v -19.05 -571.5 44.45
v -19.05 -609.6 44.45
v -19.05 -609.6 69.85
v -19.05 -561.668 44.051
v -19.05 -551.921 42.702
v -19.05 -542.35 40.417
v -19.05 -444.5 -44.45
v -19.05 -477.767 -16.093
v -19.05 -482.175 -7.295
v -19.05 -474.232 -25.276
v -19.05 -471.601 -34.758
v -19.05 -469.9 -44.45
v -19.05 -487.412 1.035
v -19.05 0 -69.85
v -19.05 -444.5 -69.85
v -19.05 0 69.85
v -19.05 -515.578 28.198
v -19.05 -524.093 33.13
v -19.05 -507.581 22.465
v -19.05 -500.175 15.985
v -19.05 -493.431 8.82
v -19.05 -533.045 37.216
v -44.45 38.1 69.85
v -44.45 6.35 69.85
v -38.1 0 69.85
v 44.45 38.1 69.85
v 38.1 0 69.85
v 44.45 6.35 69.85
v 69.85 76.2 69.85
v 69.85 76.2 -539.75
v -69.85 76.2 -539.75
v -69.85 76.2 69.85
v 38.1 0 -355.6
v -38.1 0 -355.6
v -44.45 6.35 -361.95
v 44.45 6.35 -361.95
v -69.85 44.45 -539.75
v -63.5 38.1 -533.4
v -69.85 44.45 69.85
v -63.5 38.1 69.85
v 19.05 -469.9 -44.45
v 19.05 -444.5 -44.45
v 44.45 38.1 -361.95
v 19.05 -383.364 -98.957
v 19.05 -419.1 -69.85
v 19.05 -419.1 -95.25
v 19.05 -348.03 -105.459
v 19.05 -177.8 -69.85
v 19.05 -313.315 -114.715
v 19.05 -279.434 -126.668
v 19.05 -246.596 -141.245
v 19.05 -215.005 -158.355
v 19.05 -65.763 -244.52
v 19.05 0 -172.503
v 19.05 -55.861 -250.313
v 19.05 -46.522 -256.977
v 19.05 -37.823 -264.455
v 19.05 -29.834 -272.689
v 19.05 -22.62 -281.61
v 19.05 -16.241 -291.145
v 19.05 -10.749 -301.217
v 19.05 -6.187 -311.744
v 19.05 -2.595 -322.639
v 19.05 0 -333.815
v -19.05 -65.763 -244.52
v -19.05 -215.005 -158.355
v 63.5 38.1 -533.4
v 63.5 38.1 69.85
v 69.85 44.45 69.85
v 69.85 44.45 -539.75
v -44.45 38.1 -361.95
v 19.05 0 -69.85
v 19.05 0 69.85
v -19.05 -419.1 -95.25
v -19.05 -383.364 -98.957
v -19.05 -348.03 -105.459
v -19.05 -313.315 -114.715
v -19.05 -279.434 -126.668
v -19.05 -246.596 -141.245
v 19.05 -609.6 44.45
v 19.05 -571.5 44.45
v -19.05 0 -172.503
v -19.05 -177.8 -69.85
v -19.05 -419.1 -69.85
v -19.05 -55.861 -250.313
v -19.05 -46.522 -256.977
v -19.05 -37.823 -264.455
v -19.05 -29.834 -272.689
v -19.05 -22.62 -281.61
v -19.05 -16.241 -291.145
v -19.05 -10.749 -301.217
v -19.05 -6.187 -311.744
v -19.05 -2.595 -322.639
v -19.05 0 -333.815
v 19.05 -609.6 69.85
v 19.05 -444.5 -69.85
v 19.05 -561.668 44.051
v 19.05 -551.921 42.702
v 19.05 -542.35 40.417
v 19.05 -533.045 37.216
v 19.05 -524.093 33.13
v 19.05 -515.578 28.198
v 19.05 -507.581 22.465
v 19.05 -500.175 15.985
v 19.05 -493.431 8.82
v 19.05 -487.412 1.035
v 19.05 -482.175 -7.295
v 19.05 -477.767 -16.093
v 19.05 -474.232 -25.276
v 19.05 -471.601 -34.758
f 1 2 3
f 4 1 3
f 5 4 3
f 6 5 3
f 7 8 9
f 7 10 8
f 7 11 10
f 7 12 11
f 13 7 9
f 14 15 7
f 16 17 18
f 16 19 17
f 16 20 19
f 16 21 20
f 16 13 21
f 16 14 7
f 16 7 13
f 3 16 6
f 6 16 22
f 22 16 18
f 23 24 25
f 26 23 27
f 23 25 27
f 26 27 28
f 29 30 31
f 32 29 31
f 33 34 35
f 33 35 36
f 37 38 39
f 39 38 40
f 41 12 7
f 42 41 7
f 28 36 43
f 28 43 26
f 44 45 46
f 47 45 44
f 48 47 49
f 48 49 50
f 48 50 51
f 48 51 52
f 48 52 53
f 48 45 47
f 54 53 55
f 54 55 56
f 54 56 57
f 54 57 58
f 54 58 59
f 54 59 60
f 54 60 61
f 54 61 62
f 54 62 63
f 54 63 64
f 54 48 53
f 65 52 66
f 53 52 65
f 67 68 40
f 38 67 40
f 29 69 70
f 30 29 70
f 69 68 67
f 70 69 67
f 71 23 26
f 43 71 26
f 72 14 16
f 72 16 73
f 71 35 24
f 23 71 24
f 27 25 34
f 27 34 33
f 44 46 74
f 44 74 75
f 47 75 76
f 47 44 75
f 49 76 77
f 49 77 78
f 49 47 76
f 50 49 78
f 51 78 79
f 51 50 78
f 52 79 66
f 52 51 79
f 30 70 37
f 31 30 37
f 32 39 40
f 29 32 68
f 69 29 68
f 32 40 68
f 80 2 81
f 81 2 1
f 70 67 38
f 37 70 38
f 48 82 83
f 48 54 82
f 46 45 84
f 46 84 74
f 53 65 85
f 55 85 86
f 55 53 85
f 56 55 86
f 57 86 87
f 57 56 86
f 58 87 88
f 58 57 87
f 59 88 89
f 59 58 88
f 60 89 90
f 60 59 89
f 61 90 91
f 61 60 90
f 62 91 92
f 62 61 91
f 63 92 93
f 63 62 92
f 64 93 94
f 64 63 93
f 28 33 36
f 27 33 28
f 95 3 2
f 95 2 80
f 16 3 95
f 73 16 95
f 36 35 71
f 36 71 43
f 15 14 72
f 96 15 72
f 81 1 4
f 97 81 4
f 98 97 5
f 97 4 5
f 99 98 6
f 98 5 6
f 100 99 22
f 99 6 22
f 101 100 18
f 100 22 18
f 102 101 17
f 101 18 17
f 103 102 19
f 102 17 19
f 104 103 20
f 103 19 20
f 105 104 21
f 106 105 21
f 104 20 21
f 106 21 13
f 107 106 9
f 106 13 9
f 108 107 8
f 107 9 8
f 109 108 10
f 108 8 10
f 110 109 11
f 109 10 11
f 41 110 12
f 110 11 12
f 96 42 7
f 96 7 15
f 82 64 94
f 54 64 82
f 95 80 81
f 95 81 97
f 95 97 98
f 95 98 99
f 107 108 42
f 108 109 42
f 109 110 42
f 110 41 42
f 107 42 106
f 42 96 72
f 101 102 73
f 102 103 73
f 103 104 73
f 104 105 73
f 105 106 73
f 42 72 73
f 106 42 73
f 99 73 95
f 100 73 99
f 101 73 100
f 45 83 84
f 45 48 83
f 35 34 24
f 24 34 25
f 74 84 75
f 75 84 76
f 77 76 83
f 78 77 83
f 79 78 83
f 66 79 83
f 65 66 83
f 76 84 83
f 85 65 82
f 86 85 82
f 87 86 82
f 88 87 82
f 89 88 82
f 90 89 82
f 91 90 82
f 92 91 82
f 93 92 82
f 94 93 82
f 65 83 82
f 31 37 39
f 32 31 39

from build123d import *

# Parameters (mm, degrees)
F0_W       = 38.1
F0_H       = 139.7
F1_DEPTH   = 609.6
F2_W       = 88.9
F2_H       = 431.8
F3_DEPTH   = 38.1
F5_DEPTH   = 19.05
F6_W       = 88.9
F6_H       = 431.8
F7_DEPTH   = 38.1
F9_DEPTH   = 38.1
F10_SIZE   = 6.35
F10_2_SIZE = 6.35


with BuildPart() as f1:
    # F0 (on Front) → F1 (new body)
    with BuildSketch(Plane.XZ):
        Rectangle(F0_W, F0_H)
    extrude(amount=F1_DEPTH)

    # F8 (on face) → F9 (cut, through all)
    with BuildSketch(Plane(origin=(-19.05, 0, 0), x_dir=(0, -1, 0), z_dir=(-1, 0, 0))):
        with BuildLine():
            Line((609.6, -69.85), (609.6, 44.45))
            Line((609.6, 44.45), (571.5, 44.45))
            ThreePointArc((571.5, 44.45), (503.79945, 19.314914), (469.9, -44.45))
            Line((469.9, -44.45), (444.5, -44.45))
            Line((444.5, -44.45), (444.5, -69.85))
            Line((444.5, -69.85), (609.6, -69.85))
        make_face()
    extrude(amount=-F9_DEPTH, mode=Mode.SUBTRACT)


with BuildPart() as f3:
    # F2 (on Front) → F3 (new body)
    with BuildSketch(Plane.XZ):
        with Locations((0, -146.05)):
            Rectangle(F2_W, F2_H)
    extrude(amount=-F3_DEPTH)

    # F10
    f10_edges = [f3.edges().sort_by_distance(p)[0] for p in [
        (44.45, 0, -146.05),
        (-44.45, 0, -146.05),
        (0, 0, -361.95),
    ]]
    chamfer(f10_edges, length=F10_SIZE)


with BuildPart() as f5:
    # F4 (on Right) → F5 (new body, symmetric)
    with BuildSketch(Plane.YZ):
        with BuildLine():
            Line((-177.8, -69.85), (-419.1, -69.85))
            Line((-419.1, -69.85), (-419.1, -95.25))
            ThreePointArc((-419.1, -95.25), (-313.314788, -114.714767), (-215.004547, -158.355171))
            Line((-215.004547, -158.355171), (-65.763181, -244.519714))
            ThreePointArc((-65.763181, -244.519714), (-22.620063, -281.609796), (0, -333.814543))
            Line((0, -333.814543), (0, -172.502878))
            Line((0, -172.502878), (-177.8, -69.85))
        make_face()
    extrude(amount=F5_DEPTH, both=True)


with BuildPart() as f7:
    # F6 (on face) → F7 (new body)
    with BuildSketch(Plane(origin=(0, 38.1, 0), x_dir=(-1, 0, 0), z_dir=(0, 1, 0))):
        Polygon((-44.45, 69.85), (-69.85, 69.85), (-69.85, -539.75), (69.85, -539.75), (69.85, 69.85), (44.45, 69.85), (44.45, -361.95), (-44.45, -361.95), align=None)
        with Locations((0, -146.05)):
            Rectangle(F6_W, F6_H)
    extrude(amount=F7_DEPTH)

    # F10#2
    f10_2_edges = [f7.edges().sort_by_distance(p)[0] for p in [
        (69.85, 38.1, -234.95),
        (0, 38.1, -539.75),
        (-69.85, 38.1, -234.95),
    ]]
    chamfer(f10_2_edges, length=F10_2_SIZE)


solid = Compound([f1.part, f3.part, f5.part, f7.part])
